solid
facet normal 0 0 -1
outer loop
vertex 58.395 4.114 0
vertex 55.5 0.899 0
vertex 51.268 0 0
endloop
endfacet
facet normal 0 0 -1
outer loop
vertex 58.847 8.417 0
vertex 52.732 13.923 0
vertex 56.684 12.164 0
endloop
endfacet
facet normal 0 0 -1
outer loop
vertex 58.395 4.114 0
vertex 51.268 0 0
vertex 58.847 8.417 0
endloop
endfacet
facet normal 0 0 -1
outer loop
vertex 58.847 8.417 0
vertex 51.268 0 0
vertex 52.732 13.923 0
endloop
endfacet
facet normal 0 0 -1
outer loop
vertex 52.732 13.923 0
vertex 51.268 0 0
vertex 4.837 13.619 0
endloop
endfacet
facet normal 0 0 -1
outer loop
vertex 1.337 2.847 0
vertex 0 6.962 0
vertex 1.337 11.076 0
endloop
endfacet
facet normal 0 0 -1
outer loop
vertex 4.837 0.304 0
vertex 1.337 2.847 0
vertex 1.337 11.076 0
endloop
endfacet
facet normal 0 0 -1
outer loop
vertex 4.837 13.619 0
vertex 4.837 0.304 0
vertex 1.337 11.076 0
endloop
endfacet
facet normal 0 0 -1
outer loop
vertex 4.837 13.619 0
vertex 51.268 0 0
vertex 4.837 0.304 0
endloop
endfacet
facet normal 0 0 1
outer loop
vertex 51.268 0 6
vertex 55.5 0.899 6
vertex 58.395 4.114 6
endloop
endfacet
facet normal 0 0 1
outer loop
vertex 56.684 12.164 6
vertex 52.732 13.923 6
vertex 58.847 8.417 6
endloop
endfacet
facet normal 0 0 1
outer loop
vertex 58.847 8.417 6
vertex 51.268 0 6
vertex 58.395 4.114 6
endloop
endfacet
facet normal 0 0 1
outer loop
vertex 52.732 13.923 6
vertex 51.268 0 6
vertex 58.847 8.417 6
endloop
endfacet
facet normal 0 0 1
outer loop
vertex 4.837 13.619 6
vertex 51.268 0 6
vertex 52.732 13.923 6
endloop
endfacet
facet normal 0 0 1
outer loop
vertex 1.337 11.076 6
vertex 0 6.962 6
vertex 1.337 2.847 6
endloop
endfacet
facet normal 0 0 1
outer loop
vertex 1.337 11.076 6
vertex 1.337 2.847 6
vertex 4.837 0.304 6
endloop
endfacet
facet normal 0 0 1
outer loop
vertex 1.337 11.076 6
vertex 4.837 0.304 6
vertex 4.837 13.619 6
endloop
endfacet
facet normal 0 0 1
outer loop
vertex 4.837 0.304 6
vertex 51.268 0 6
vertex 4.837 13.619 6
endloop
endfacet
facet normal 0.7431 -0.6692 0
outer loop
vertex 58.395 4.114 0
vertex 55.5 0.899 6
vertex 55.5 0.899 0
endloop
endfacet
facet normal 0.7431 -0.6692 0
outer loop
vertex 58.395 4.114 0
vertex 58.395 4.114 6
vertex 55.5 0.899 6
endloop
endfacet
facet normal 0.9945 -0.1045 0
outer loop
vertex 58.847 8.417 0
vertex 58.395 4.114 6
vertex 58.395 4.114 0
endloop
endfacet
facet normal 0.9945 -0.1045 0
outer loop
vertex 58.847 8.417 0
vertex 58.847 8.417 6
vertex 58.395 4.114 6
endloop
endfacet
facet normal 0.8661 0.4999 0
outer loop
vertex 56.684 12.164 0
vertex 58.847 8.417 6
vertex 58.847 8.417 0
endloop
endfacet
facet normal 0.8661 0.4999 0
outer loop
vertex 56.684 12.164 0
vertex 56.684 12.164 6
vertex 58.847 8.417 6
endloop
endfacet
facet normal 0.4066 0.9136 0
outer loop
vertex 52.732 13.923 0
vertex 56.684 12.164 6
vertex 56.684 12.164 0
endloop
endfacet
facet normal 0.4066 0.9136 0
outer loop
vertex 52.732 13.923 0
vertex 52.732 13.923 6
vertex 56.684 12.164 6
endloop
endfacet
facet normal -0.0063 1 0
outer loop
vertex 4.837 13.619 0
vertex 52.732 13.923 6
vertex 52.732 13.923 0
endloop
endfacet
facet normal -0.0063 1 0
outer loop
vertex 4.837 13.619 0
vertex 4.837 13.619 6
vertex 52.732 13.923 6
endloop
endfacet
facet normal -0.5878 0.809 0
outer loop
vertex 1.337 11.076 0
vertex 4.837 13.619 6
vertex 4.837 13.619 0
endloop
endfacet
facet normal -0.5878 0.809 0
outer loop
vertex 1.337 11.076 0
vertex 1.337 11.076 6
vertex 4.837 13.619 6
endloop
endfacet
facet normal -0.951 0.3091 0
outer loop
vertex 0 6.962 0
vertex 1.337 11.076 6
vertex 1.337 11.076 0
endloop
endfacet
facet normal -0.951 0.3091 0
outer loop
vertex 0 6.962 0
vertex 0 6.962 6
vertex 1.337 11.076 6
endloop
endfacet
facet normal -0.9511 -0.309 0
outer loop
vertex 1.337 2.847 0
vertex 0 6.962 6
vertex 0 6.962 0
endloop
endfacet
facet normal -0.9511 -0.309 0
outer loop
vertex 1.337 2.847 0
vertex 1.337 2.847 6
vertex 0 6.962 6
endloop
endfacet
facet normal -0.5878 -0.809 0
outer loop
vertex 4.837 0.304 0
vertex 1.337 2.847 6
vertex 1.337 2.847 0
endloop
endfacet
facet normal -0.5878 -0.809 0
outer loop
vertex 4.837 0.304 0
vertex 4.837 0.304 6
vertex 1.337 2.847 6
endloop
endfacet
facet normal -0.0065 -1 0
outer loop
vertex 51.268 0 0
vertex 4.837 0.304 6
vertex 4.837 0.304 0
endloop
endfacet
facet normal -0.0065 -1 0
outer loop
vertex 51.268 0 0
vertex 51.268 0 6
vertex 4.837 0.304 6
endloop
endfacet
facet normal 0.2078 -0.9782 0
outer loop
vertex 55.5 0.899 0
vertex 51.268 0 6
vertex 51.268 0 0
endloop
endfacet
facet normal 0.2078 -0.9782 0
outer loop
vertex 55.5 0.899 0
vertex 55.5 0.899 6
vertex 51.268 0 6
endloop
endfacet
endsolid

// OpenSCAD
$fn = 32;

// ----------------------------------------------------------------------
// Lever arm: two bosses 14 and 14 mm, 45 mm between centres
// ----------------------------------------------------------------------

// --- parameters (mm) ---
profile_height = 6;       // extrusion height
profile_points = 11;      // points of the closed outline

profile = [[0, 6.962], [1.337, 2.847], [4.837, 0.304], [51.268, 0], [55.5, 0.899], [58.395, 4.114], [58.847, 8.417], [56.684, 12.164], [52.732, 13.923], [4.837, 13.619], [1.337, 11.076]];  // single closed polygon, 11 points, counter clockwise

// --- the one profile operation ---
linear_extrude(height = profile_height) polygon(points = profile);
